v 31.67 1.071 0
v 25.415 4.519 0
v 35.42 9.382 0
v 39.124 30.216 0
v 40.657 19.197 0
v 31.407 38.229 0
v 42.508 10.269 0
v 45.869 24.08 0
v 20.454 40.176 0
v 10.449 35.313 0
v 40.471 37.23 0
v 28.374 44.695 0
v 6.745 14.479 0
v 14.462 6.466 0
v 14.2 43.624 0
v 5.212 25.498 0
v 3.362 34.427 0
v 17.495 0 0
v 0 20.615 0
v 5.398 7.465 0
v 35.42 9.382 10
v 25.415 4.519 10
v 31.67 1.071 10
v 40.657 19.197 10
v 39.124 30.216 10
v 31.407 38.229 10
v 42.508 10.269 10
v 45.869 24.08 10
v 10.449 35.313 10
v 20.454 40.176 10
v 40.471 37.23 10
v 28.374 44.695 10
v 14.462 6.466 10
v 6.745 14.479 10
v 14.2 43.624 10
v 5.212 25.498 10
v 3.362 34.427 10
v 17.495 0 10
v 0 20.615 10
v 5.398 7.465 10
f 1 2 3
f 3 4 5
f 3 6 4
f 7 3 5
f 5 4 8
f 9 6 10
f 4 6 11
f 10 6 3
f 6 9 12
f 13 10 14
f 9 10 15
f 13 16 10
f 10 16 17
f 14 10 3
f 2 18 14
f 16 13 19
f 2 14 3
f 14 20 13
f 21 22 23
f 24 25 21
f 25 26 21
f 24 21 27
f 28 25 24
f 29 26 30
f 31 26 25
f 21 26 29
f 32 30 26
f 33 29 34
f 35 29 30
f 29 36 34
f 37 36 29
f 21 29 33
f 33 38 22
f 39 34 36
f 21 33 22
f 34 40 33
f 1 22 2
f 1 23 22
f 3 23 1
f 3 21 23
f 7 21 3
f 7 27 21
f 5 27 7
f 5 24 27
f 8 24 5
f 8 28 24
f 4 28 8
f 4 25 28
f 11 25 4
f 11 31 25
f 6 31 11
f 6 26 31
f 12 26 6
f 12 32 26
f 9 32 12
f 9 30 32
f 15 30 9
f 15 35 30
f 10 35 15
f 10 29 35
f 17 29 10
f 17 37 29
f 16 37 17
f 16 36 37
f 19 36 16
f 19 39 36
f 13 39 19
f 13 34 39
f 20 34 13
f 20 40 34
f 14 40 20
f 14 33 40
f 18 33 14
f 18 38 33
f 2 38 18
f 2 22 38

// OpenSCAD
$fn = 32;

// ----------------------------------------------------------------------
// Chain sprocket: 10 teeth, 18 mm root radius
// ----------------------------------------------------------------------

// --- parameters (mm) ---
profile_height = 10;      // extrusion height
profile_points = 20;      // points of the closed outline

profile = [[40.657, 19.197], [45.869, 24.08], [39.124, 30.216], [40.471, 37.23], [31.407, 38.229], [28.374, 44.695], [20.454, 40.176], [14.2, 43.624], [10.449, 35.313], [3.362, 34.427], [5.212, 25.498], [0, 20.615], [6.745, 14.479], [5.398, 7.465], [14.462, 6.466], [17.495, 0], [25.415, 4.519], [31.67, 1.071], [35.42, 9.382], [42.508, 10.269]];  // single closed polygon, 20 points, counter clockwise

// --- the one profile operation ---
linear_extrude(height = profile_height) polygon(points = profile);
